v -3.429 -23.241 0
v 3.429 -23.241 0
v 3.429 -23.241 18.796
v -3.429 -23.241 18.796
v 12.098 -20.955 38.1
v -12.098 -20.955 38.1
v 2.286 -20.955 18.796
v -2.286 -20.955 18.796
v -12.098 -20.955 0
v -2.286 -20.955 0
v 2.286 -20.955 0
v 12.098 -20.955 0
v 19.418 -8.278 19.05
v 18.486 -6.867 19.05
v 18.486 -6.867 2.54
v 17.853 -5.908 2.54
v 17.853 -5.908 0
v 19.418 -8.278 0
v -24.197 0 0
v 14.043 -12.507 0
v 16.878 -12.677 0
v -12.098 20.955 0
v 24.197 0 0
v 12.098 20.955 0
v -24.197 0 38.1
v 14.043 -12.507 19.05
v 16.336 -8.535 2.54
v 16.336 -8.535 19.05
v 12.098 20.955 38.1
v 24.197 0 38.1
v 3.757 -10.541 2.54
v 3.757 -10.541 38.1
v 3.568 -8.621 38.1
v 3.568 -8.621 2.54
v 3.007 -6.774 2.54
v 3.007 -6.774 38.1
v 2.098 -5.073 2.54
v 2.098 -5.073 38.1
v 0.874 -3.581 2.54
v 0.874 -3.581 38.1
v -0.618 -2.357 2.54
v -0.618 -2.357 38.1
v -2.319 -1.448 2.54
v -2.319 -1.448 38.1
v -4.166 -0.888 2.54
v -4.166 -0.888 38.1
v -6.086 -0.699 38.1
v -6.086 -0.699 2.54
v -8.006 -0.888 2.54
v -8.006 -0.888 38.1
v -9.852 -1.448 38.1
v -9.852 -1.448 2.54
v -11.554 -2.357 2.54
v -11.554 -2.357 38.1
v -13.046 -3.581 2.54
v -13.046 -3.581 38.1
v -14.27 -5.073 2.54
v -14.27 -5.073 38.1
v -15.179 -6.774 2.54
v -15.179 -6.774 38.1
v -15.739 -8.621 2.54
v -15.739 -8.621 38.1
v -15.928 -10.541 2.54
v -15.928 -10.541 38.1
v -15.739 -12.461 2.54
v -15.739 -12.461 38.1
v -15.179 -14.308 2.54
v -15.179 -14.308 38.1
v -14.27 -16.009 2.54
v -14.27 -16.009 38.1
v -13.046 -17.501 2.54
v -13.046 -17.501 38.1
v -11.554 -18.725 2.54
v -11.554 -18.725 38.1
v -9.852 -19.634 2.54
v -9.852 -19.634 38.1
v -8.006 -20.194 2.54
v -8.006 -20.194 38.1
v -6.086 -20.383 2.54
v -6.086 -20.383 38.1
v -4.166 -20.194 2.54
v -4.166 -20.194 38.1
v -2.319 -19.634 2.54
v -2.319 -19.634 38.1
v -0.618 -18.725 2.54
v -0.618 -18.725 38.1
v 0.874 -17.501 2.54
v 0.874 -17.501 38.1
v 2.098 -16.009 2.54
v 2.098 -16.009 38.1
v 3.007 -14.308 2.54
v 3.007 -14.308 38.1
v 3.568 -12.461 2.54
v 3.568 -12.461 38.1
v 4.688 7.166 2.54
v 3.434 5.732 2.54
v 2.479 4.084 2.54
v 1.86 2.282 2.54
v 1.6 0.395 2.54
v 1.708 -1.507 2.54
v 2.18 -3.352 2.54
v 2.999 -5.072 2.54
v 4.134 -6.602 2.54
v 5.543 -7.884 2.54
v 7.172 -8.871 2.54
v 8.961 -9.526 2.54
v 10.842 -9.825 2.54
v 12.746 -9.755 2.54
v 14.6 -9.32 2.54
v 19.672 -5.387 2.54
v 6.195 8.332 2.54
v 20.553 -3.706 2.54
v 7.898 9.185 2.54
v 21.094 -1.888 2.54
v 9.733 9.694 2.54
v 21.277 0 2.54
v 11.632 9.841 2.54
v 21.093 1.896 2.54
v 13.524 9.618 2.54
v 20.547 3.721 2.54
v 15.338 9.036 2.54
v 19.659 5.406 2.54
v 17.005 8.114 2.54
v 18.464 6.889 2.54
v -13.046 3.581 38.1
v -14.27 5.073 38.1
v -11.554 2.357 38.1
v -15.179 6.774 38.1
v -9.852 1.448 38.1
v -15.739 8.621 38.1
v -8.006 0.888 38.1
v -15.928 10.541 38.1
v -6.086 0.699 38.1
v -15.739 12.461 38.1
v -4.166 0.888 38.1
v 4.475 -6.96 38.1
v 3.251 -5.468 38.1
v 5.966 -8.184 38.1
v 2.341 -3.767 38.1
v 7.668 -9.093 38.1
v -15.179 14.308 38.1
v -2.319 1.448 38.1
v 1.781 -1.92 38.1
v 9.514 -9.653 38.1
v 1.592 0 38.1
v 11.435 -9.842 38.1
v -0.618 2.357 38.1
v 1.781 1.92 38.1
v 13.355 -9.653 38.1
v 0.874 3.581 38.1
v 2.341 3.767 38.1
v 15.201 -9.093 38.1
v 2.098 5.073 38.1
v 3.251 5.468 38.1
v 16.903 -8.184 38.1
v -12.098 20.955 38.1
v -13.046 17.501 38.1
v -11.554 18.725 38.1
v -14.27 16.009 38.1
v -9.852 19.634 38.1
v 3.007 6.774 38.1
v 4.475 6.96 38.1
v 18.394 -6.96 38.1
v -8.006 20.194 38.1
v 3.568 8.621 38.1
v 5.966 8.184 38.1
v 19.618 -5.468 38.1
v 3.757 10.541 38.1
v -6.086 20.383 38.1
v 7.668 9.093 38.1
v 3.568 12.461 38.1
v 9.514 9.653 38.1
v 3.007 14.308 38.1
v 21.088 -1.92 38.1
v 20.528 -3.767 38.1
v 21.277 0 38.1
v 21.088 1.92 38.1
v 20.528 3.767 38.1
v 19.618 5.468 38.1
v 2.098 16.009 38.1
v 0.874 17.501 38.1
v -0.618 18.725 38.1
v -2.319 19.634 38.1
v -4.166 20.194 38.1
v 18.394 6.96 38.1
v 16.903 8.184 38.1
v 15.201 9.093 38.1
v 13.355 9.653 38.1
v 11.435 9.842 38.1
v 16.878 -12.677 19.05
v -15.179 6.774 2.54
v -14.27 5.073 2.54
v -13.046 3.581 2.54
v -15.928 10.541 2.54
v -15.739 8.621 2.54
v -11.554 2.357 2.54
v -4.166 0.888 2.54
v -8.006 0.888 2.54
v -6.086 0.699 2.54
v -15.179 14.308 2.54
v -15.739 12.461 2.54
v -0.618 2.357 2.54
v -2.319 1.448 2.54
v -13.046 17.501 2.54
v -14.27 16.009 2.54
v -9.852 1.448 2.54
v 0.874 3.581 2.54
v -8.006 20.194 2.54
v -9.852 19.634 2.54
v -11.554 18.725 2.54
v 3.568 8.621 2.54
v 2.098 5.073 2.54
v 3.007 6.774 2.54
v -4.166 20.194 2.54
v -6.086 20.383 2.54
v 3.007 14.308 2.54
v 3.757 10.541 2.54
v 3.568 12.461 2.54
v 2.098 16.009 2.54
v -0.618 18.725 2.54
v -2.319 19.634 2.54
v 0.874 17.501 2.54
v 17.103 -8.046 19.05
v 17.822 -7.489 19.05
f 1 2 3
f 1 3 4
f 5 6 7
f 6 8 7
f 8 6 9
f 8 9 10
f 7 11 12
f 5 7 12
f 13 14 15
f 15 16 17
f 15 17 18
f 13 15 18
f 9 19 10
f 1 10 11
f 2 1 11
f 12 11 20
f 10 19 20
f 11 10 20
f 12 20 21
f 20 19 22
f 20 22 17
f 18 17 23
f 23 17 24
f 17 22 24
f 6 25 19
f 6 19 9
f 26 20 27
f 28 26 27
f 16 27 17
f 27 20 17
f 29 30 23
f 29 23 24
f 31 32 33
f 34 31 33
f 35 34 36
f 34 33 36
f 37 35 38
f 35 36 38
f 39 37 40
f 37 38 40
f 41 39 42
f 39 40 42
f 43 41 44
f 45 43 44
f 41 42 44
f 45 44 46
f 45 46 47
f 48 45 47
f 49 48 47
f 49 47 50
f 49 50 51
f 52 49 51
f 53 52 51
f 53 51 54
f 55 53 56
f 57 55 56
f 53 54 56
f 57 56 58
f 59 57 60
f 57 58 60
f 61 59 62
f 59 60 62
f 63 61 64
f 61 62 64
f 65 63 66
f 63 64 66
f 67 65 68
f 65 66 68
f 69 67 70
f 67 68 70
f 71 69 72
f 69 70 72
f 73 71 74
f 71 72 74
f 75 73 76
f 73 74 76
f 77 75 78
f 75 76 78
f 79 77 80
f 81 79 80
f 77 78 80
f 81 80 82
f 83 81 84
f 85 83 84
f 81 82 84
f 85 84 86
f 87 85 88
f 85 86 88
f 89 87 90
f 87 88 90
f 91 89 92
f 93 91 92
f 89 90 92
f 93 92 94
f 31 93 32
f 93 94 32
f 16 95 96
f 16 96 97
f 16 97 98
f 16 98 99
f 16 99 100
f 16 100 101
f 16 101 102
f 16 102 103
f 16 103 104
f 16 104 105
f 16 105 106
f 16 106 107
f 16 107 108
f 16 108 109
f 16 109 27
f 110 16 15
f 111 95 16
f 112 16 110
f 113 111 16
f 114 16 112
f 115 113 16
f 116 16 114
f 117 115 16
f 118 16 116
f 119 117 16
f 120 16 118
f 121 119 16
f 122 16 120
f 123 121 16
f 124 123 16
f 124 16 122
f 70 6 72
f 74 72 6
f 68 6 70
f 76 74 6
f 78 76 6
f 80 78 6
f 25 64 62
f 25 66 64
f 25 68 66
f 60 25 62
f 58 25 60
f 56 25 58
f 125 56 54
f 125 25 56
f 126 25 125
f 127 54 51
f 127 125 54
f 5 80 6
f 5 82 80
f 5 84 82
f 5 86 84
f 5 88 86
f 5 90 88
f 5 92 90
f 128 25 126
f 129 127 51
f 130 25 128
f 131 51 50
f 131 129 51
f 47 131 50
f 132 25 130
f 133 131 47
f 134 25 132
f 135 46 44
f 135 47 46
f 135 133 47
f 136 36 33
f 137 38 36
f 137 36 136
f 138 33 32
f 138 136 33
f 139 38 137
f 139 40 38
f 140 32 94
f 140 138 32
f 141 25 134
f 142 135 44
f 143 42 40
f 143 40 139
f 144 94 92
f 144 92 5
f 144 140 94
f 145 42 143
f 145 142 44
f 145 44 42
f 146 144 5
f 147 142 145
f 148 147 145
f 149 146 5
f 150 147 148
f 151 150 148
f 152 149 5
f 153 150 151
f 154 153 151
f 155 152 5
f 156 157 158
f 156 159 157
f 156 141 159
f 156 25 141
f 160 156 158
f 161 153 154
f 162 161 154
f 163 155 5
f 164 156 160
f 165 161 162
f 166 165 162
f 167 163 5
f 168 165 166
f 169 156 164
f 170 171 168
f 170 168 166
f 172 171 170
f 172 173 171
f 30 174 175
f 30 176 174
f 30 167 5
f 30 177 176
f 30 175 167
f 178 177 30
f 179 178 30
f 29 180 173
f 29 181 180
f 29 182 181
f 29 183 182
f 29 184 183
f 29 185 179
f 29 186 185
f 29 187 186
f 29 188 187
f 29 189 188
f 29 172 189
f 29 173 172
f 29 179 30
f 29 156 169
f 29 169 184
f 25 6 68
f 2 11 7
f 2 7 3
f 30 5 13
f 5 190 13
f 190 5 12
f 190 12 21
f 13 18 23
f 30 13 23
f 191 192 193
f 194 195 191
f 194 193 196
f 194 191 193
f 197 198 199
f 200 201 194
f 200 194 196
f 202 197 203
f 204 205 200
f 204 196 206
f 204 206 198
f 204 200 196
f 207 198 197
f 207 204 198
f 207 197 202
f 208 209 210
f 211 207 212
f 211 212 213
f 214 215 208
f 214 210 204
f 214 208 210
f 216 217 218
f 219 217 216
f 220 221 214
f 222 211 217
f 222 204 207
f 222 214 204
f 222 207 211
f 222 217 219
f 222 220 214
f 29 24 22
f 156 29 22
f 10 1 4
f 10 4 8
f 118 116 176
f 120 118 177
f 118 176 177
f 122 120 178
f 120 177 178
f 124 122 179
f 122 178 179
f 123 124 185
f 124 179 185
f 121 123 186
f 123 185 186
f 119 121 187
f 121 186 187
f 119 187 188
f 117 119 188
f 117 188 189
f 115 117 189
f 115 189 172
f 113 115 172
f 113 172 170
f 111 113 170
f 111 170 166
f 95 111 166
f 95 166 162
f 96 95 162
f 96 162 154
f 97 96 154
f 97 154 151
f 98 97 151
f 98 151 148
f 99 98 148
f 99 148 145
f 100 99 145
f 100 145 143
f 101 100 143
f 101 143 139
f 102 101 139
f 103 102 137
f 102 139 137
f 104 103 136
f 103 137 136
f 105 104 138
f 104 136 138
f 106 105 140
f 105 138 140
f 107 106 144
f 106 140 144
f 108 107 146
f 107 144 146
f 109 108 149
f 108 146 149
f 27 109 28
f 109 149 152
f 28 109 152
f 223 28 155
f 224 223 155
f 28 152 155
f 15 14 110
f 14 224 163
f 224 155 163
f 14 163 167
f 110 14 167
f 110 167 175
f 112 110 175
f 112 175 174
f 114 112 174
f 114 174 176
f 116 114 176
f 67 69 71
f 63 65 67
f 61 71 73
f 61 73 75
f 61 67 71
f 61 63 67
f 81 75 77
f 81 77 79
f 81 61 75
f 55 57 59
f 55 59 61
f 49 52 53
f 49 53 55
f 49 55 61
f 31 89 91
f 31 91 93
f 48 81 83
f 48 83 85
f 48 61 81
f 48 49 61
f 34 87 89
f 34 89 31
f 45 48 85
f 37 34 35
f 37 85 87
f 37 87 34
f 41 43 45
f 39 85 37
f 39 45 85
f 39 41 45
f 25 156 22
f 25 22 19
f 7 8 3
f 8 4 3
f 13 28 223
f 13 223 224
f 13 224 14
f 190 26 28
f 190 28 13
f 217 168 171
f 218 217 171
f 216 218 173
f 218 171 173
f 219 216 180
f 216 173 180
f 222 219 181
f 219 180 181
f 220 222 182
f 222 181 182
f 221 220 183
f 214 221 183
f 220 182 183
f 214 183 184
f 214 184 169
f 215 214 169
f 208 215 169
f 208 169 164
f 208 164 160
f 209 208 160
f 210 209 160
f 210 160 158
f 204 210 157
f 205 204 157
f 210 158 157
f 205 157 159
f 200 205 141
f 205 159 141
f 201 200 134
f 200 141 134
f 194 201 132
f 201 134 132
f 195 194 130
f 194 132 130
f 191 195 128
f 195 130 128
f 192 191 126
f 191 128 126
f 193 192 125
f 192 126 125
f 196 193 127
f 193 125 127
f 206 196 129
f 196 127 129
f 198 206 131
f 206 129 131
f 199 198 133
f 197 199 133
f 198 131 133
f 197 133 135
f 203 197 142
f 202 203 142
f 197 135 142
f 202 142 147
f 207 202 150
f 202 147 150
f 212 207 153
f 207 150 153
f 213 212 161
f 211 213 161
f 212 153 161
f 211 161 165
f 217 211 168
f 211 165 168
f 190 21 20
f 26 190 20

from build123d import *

# Parameters (mm, degrees)
F1_DEPTH = 38.1
F3_DEPTH = 18.796
F5_DEPTH = 19.05
F6_R     = 9.8425
F7_DEPTH = 35.56


with BuildPart() as f1:
    # F0 (on Top) → F1 (new body)
    with BuildSketch(Plane.XY):
        Polygon((-12.0983748909, -20.955), (12.0983748909, -20.955), (24.1967497817, 0), (12.0983748909, 20.955), (-12.0983748909, 20.955), (-24.1967497817, 0), align=None)
    extrude(amount=F1_DEPTH)

    # F2 (on face) → F3 (join)
    with BuildSketch(Plane(origin=(0, 0, 0), x_dir=(1, 0, 0), z_dir=(0, 0, -1))):
        Polygon((-2.286, 20.955), (0, 20.955), (0, 23.241), (-3.429, 23.241), align=None)
        Polygon((0, 23.241), (0, 20.955), (2.286, 20.955), (3.429, 23.241), align=None)
    extrude(amount=-F3_DEPTH)

    # F4 (on face) → F5 (cut)
    with BuildSketch(Plane(origin=(0, 0, 0), x_dir=(1, 0, 0), z_dir=(0, 0, -1))):
        Polygon((15.9478578107, 9.2075), (18.1475623363, 10.4775), (16.8775623363, 12.6772045256), (14.0428578107, 12.5070567884), align=None)
        Polygon((19.4175623363, 8.2777954744), (18.1475623363, 10.4775), (15.9478578107, 9.2075), (17.8528578107, 5.9079432116), align=None)
    extrude(amount=-F5_DEPTH, mode=Mode.SUBTRACT)

    # F6 (on face) → F7 (cut)
    with BuildSketch(Plane.XY.offset(38.1)):
        with Locations((-6.0858491875, -10.541)):
            Circle(F6_R)
        with Locations((-6.0858491875, 10.541)):
            Circle(F6_R)
        with Locations((11.4346282032, 0)):
            Circle(F6_R)
    extrude(amount=-F7_DEPTH, mode=Mode.SUBTRACT)


solid = f1.part
